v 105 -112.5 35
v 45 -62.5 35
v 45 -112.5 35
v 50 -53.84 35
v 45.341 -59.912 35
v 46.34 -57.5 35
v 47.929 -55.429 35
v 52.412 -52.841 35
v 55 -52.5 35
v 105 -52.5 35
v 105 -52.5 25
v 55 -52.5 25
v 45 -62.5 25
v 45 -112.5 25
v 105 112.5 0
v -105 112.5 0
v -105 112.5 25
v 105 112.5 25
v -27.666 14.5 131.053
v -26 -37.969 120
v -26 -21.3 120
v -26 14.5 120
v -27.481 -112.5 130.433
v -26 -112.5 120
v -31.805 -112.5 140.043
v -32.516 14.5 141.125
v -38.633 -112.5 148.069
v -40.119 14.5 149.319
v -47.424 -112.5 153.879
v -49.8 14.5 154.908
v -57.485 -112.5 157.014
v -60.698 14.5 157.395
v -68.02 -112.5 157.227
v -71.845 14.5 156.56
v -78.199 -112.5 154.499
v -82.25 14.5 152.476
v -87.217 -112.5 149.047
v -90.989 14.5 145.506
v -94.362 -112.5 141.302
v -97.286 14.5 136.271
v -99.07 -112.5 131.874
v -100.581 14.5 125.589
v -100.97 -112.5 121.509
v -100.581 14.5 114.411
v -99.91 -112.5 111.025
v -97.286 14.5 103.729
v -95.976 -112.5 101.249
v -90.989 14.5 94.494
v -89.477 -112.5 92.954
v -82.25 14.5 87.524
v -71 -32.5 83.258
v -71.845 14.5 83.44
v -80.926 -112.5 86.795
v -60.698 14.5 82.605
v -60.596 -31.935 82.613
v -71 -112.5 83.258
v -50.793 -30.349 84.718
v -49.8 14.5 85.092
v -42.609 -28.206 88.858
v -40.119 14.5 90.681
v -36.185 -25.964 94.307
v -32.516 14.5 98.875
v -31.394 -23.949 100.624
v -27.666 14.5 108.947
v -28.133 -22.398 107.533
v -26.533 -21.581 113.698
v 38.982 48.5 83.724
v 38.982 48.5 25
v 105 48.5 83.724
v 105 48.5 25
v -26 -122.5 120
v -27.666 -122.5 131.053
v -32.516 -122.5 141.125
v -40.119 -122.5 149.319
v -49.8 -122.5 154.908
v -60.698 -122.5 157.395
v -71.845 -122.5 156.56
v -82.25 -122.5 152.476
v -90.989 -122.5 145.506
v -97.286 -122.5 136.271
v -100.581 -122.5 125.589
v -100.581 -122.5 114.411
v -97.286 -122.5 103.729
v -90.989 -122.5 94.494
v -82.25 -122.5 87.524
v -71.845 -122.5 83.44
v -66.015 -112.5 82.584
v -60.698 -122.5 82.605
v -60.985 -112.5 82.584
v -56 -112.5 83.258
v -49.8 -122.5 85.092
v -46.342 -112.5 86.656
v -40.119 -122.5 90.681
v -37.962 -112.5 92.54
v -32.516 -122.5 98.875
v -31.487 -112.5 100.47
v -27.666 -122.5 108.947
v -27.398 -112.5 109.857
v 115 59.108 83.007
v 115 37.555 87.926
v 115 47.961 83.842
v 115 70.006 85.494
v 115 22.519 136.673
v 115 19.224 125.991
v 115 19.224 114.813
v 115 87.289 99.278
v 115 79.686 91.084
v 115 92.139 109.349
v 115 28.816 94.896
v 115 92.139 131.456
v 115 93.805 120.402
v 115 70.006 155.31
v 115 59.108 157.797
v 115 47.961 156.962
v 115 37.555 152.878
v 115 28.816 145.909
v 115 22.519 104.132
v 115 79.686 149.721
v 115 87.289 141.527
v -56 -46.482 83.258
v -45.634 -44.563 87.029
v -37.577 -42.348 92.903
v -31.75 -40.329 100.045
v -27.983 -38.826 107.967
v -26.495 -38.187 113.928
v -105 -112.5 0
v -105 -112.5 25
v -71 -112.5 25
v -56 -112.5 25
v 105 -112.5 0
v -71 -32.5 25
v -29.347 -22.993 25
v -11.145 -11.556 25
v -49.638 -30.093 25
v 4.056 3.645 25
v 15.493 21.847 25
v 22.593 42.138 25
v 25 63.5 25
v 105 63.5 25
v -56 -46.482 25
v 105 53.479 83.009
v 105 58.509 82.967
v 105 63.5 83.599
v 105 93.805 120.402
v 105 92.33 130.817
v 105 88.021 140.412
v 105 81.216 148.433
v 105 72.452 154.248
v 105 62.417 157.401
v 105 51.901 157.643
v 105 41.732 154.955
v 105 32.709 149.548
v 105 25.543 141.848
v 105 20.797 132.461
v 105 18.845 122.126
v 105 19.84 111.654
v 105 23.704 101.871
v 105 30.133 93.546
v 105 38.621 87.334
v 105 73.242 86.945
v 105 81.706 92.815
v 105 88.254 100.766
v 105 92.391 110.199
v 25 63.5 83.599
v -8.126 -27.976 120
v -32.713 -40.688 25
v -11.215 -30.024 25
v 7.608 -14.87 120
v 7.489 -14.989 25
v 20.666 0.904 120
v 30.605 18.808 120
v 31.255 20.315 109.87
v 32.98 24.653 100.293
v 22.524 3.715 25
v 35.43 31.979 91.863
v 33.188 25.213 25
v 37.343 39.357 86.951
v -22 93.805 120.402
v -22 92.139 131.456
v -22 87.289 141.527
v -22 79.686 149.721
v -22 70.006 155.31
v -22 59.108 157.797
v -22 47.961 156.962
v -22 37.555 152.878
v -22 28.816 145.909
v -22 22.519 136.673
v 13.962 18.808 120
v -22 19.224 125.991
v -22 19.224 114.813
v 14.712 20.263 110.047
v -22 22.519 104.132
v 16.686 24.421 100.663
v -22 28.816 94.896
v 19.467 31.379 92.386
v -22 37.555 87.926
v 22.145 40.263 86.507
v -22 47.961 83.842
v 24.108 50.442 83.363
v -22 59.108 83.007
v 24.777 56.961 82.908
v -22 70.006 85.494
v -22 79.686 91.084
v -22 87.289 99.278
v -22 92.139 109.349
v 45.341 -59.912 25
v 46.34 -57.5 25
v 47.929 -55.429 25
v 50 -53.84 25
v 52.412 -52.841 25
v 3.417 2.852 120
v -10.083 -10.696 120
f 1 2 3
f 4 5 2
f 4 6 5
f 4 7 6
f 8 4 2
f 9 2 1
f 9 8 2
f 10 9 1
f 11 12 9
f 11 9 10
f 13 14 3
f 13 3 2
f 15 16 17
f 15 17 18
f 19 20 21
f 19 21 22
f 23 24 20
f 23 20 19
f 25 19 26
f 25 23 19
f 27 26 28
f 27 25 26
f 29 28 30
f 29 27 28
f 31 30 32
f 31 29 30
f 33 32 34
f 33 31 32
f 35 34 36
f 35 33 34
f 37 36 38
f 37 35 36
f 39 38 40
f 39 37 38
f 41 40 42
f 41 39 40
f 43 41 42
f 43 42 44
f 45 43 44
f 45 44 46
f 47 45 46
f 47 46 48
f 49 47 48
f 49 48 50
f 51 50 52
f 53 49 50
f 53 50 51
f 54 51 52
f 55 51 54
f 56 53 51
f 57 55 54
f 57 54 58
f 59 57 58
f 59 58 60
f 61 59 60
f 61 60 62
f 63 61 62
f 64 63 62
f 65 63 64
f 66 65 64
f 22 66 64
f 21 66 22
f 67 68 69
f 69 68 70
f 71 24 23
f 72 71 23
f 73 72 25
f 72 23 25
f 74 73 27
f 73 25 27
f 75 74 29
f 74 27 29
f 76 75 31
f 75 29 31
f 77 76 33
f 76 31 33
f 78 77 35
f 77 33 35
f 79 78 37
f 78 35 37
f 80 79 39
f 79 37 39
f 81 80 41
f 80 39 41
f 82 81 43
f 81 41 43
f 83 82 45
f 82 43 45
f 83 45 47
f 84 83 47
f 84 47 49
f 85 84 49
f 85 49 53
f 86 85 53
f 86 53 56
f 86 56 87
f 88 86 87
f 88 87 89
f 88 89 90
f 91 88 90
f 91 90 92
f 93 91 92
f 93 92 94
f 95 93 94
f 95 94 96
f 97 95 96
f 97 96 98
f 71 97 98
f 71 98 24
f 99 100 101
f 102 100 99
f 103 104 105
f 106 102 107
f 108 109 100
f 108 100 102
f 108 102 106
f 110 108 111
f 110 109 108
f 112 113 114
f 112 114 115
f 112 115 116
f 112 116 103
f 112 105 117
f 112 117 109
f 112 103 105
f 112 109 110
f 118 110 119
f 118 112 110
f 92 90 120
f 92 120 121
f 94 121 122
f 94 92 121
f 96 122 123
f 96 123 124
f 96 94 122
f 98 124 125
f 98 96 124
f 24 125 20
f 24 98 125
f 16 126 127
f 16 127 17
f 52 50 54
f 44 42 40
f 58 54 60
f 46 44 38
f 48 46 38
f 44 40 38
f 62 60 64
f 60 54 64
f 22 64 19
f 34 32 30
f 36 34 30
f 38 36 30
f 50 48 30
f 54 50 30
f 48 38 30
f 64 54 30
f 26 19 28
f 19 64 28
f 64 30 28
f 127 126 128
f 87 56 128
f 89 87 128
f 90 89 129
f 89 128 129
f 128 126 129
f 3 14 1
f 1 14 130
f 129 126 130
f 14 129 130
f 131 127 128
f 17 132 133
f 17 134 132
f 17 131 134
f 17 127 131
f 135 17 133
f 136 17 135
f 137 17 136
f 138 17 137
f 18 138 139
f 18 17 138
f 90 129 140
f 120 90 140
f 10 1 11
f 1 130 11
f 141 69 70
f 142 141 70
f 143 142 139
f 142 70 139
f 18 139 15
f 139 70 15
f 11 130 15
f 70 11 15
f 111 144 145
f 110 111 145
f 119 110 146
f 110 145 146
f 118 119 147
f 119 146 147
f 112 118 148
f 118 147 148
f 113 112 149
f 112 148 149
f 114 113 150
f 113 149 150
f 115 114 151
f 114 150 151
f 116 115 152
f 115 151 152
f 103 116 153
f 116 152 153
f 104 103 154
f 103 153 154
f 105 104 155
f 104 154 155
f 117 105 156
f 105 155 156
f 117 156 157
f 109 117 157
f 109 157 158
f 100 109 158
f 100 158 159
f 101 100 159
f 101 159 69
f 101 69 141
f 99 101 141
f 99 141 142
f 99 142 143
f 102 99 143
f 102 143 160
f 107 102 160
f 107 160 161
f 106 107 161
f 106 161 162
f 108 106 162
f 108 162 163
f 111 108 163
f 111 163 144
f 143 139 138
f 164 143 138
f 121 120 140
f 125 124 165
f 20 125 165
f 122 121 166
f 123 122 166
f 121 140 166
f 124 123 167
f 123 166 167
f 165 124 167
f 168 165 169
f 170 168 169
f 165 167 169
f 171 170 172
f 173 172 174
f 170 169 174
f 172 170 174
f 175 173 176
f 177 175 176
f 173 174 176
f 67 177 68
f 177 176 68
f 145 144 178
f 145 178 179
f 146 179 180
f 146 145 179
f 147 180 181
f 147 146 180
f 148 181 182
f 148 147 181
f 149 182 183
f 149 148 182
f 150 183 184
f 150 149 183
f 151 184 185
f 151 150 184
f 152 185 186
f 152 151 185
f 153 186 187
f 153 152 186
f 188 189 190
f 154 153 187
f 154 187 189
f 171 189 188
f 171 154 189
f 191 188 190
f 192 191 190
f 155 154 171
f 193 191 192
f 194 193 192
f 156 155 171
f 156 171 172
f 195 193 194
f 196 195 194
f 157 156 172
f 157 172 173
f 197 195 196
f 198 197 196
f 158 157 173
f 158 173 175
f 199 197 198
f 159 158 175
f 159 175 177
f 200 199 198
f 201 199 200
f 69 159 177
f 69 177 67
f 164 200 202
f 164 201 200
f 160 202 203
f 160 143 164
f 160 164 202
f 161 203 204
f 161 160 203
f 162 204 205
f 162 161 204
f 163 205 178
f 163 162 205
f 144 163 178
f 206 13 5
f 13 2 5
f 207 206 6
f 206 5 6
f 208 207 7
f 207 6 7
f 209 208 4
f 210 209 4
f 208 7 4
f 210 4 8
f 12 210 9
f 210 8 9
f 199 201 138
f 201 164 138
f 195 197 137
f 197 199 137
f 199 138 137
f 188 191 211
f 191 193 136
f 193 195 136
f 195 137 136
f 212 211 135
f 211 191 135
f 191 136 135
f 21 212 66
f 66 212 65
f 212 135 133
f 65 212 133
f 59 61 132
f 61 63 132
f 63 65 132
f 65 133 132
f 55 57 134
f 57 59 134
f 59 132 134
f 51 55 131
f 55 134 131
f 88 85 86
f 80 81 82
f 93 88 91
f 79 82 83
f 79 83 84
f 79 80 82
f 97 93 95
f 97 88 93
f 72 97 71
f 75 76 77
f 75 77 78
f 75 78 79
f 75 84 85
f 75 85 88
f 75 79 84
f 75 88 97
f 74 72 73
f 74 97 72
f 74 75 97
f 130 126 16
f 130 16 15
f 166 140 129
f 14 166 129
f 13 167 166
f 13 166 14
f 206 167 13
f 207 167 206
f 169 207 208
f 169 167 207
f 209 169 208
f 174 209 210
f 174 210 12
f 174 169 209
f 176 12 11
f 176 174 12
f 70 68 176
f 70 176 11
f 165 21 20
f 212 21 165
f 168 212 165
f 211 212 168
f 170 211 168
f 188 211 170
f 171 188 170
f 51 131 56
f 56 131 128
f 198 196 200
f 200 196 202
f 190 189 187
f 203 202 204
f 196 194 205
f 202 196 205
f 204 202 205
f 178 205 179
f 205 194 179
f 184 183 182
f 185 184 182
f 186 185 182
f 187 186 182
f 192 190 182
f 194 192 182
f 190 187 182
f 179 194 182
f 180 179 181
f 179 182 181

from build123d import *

# Parameters (mm, degrees)
F0_W          = 210
F0_H          = 225
F1_DEPTH      = 25
F3_DEPTH      = 95
F4_R          = 37.5
F5_DEPTH      = 10
F5_DEPTH_BACK = 127
F6_R          = 37.5
F7_DEPTH      = 10
F7_DEPTH_BACK = 127
F8_W          = 60
F8_H          = 60
F9_DEPTH      = 10
F10_R         = 10


with BuildPart() as f1:
    # F0 (on Top) → F1 (new body)
    with BuildSketch(Plane.XY):
        Rectangle(F0_W, F0_H)
    extrude(amount=F1_DEPTH)

    # F2 (on face) → F3 (join)
    with BuildSketch(Plane.XY.offset(25)):
        with BuildLine():
            Line((-71, -32.5), (-71, -112.5))
            Line((-71, -112.5), (-56, -112.5))
            Line((-56, -112.5), (-56, -46.481817))
            ThreePointArc((-56, -46.481817), (7.488853, -14.988853), (38.981817, 48.5))
            Line((38.981817, 48.5), (105, 48.5))
            Line((105, 48.5), (105, 63.5))
            Line((105, 63.5), (25, 63.5))
            ThreePointArc((25, 63.5), (-3.117749, -4.382251), (-71, -32.5))
        make_face()
    extrude(amount=F3_DEPTH)

    # F4 (on face) → F5 (join, two sides)
    with BuildSketch(Plane.XZ.offset(112.5)) as f5_sk:
        with Locations((-63.5, 120)):
            Circle(F4_R)
    extrude(amount=F5_DEPTH)
    extrude(f5_sk.sketch, amount=-F5_DEPTH_BACK)

    # F6 (on face) → F7 (join, two sides)
    with BuildSketch(Plane.YZ.offset(105)) as f7_sk:
        with Locations((56.305401, 120.402195)):
            Circle(F6_R)
    extrude(amount=F7_DEPTH)
    extrude(f7_sk.sketch, amount=-F7_DEPTH_BACK)

    # F8 (on face) → F9 (join)
    with BuildSketch(Plane.XY.offset(25)):
        with Locations((75, -82.5)):
            Rectangle(F8_W, F8_H)
    extrude(amount=F9_DEPTH)

    # F10
    f10_edges = [f1.edges().sort_by_distance(p)[0] for p in [
        (45, -52.5, 30),
    ]]
    fillet(f10_edges, radius=F10_R)


solid = f1.part
